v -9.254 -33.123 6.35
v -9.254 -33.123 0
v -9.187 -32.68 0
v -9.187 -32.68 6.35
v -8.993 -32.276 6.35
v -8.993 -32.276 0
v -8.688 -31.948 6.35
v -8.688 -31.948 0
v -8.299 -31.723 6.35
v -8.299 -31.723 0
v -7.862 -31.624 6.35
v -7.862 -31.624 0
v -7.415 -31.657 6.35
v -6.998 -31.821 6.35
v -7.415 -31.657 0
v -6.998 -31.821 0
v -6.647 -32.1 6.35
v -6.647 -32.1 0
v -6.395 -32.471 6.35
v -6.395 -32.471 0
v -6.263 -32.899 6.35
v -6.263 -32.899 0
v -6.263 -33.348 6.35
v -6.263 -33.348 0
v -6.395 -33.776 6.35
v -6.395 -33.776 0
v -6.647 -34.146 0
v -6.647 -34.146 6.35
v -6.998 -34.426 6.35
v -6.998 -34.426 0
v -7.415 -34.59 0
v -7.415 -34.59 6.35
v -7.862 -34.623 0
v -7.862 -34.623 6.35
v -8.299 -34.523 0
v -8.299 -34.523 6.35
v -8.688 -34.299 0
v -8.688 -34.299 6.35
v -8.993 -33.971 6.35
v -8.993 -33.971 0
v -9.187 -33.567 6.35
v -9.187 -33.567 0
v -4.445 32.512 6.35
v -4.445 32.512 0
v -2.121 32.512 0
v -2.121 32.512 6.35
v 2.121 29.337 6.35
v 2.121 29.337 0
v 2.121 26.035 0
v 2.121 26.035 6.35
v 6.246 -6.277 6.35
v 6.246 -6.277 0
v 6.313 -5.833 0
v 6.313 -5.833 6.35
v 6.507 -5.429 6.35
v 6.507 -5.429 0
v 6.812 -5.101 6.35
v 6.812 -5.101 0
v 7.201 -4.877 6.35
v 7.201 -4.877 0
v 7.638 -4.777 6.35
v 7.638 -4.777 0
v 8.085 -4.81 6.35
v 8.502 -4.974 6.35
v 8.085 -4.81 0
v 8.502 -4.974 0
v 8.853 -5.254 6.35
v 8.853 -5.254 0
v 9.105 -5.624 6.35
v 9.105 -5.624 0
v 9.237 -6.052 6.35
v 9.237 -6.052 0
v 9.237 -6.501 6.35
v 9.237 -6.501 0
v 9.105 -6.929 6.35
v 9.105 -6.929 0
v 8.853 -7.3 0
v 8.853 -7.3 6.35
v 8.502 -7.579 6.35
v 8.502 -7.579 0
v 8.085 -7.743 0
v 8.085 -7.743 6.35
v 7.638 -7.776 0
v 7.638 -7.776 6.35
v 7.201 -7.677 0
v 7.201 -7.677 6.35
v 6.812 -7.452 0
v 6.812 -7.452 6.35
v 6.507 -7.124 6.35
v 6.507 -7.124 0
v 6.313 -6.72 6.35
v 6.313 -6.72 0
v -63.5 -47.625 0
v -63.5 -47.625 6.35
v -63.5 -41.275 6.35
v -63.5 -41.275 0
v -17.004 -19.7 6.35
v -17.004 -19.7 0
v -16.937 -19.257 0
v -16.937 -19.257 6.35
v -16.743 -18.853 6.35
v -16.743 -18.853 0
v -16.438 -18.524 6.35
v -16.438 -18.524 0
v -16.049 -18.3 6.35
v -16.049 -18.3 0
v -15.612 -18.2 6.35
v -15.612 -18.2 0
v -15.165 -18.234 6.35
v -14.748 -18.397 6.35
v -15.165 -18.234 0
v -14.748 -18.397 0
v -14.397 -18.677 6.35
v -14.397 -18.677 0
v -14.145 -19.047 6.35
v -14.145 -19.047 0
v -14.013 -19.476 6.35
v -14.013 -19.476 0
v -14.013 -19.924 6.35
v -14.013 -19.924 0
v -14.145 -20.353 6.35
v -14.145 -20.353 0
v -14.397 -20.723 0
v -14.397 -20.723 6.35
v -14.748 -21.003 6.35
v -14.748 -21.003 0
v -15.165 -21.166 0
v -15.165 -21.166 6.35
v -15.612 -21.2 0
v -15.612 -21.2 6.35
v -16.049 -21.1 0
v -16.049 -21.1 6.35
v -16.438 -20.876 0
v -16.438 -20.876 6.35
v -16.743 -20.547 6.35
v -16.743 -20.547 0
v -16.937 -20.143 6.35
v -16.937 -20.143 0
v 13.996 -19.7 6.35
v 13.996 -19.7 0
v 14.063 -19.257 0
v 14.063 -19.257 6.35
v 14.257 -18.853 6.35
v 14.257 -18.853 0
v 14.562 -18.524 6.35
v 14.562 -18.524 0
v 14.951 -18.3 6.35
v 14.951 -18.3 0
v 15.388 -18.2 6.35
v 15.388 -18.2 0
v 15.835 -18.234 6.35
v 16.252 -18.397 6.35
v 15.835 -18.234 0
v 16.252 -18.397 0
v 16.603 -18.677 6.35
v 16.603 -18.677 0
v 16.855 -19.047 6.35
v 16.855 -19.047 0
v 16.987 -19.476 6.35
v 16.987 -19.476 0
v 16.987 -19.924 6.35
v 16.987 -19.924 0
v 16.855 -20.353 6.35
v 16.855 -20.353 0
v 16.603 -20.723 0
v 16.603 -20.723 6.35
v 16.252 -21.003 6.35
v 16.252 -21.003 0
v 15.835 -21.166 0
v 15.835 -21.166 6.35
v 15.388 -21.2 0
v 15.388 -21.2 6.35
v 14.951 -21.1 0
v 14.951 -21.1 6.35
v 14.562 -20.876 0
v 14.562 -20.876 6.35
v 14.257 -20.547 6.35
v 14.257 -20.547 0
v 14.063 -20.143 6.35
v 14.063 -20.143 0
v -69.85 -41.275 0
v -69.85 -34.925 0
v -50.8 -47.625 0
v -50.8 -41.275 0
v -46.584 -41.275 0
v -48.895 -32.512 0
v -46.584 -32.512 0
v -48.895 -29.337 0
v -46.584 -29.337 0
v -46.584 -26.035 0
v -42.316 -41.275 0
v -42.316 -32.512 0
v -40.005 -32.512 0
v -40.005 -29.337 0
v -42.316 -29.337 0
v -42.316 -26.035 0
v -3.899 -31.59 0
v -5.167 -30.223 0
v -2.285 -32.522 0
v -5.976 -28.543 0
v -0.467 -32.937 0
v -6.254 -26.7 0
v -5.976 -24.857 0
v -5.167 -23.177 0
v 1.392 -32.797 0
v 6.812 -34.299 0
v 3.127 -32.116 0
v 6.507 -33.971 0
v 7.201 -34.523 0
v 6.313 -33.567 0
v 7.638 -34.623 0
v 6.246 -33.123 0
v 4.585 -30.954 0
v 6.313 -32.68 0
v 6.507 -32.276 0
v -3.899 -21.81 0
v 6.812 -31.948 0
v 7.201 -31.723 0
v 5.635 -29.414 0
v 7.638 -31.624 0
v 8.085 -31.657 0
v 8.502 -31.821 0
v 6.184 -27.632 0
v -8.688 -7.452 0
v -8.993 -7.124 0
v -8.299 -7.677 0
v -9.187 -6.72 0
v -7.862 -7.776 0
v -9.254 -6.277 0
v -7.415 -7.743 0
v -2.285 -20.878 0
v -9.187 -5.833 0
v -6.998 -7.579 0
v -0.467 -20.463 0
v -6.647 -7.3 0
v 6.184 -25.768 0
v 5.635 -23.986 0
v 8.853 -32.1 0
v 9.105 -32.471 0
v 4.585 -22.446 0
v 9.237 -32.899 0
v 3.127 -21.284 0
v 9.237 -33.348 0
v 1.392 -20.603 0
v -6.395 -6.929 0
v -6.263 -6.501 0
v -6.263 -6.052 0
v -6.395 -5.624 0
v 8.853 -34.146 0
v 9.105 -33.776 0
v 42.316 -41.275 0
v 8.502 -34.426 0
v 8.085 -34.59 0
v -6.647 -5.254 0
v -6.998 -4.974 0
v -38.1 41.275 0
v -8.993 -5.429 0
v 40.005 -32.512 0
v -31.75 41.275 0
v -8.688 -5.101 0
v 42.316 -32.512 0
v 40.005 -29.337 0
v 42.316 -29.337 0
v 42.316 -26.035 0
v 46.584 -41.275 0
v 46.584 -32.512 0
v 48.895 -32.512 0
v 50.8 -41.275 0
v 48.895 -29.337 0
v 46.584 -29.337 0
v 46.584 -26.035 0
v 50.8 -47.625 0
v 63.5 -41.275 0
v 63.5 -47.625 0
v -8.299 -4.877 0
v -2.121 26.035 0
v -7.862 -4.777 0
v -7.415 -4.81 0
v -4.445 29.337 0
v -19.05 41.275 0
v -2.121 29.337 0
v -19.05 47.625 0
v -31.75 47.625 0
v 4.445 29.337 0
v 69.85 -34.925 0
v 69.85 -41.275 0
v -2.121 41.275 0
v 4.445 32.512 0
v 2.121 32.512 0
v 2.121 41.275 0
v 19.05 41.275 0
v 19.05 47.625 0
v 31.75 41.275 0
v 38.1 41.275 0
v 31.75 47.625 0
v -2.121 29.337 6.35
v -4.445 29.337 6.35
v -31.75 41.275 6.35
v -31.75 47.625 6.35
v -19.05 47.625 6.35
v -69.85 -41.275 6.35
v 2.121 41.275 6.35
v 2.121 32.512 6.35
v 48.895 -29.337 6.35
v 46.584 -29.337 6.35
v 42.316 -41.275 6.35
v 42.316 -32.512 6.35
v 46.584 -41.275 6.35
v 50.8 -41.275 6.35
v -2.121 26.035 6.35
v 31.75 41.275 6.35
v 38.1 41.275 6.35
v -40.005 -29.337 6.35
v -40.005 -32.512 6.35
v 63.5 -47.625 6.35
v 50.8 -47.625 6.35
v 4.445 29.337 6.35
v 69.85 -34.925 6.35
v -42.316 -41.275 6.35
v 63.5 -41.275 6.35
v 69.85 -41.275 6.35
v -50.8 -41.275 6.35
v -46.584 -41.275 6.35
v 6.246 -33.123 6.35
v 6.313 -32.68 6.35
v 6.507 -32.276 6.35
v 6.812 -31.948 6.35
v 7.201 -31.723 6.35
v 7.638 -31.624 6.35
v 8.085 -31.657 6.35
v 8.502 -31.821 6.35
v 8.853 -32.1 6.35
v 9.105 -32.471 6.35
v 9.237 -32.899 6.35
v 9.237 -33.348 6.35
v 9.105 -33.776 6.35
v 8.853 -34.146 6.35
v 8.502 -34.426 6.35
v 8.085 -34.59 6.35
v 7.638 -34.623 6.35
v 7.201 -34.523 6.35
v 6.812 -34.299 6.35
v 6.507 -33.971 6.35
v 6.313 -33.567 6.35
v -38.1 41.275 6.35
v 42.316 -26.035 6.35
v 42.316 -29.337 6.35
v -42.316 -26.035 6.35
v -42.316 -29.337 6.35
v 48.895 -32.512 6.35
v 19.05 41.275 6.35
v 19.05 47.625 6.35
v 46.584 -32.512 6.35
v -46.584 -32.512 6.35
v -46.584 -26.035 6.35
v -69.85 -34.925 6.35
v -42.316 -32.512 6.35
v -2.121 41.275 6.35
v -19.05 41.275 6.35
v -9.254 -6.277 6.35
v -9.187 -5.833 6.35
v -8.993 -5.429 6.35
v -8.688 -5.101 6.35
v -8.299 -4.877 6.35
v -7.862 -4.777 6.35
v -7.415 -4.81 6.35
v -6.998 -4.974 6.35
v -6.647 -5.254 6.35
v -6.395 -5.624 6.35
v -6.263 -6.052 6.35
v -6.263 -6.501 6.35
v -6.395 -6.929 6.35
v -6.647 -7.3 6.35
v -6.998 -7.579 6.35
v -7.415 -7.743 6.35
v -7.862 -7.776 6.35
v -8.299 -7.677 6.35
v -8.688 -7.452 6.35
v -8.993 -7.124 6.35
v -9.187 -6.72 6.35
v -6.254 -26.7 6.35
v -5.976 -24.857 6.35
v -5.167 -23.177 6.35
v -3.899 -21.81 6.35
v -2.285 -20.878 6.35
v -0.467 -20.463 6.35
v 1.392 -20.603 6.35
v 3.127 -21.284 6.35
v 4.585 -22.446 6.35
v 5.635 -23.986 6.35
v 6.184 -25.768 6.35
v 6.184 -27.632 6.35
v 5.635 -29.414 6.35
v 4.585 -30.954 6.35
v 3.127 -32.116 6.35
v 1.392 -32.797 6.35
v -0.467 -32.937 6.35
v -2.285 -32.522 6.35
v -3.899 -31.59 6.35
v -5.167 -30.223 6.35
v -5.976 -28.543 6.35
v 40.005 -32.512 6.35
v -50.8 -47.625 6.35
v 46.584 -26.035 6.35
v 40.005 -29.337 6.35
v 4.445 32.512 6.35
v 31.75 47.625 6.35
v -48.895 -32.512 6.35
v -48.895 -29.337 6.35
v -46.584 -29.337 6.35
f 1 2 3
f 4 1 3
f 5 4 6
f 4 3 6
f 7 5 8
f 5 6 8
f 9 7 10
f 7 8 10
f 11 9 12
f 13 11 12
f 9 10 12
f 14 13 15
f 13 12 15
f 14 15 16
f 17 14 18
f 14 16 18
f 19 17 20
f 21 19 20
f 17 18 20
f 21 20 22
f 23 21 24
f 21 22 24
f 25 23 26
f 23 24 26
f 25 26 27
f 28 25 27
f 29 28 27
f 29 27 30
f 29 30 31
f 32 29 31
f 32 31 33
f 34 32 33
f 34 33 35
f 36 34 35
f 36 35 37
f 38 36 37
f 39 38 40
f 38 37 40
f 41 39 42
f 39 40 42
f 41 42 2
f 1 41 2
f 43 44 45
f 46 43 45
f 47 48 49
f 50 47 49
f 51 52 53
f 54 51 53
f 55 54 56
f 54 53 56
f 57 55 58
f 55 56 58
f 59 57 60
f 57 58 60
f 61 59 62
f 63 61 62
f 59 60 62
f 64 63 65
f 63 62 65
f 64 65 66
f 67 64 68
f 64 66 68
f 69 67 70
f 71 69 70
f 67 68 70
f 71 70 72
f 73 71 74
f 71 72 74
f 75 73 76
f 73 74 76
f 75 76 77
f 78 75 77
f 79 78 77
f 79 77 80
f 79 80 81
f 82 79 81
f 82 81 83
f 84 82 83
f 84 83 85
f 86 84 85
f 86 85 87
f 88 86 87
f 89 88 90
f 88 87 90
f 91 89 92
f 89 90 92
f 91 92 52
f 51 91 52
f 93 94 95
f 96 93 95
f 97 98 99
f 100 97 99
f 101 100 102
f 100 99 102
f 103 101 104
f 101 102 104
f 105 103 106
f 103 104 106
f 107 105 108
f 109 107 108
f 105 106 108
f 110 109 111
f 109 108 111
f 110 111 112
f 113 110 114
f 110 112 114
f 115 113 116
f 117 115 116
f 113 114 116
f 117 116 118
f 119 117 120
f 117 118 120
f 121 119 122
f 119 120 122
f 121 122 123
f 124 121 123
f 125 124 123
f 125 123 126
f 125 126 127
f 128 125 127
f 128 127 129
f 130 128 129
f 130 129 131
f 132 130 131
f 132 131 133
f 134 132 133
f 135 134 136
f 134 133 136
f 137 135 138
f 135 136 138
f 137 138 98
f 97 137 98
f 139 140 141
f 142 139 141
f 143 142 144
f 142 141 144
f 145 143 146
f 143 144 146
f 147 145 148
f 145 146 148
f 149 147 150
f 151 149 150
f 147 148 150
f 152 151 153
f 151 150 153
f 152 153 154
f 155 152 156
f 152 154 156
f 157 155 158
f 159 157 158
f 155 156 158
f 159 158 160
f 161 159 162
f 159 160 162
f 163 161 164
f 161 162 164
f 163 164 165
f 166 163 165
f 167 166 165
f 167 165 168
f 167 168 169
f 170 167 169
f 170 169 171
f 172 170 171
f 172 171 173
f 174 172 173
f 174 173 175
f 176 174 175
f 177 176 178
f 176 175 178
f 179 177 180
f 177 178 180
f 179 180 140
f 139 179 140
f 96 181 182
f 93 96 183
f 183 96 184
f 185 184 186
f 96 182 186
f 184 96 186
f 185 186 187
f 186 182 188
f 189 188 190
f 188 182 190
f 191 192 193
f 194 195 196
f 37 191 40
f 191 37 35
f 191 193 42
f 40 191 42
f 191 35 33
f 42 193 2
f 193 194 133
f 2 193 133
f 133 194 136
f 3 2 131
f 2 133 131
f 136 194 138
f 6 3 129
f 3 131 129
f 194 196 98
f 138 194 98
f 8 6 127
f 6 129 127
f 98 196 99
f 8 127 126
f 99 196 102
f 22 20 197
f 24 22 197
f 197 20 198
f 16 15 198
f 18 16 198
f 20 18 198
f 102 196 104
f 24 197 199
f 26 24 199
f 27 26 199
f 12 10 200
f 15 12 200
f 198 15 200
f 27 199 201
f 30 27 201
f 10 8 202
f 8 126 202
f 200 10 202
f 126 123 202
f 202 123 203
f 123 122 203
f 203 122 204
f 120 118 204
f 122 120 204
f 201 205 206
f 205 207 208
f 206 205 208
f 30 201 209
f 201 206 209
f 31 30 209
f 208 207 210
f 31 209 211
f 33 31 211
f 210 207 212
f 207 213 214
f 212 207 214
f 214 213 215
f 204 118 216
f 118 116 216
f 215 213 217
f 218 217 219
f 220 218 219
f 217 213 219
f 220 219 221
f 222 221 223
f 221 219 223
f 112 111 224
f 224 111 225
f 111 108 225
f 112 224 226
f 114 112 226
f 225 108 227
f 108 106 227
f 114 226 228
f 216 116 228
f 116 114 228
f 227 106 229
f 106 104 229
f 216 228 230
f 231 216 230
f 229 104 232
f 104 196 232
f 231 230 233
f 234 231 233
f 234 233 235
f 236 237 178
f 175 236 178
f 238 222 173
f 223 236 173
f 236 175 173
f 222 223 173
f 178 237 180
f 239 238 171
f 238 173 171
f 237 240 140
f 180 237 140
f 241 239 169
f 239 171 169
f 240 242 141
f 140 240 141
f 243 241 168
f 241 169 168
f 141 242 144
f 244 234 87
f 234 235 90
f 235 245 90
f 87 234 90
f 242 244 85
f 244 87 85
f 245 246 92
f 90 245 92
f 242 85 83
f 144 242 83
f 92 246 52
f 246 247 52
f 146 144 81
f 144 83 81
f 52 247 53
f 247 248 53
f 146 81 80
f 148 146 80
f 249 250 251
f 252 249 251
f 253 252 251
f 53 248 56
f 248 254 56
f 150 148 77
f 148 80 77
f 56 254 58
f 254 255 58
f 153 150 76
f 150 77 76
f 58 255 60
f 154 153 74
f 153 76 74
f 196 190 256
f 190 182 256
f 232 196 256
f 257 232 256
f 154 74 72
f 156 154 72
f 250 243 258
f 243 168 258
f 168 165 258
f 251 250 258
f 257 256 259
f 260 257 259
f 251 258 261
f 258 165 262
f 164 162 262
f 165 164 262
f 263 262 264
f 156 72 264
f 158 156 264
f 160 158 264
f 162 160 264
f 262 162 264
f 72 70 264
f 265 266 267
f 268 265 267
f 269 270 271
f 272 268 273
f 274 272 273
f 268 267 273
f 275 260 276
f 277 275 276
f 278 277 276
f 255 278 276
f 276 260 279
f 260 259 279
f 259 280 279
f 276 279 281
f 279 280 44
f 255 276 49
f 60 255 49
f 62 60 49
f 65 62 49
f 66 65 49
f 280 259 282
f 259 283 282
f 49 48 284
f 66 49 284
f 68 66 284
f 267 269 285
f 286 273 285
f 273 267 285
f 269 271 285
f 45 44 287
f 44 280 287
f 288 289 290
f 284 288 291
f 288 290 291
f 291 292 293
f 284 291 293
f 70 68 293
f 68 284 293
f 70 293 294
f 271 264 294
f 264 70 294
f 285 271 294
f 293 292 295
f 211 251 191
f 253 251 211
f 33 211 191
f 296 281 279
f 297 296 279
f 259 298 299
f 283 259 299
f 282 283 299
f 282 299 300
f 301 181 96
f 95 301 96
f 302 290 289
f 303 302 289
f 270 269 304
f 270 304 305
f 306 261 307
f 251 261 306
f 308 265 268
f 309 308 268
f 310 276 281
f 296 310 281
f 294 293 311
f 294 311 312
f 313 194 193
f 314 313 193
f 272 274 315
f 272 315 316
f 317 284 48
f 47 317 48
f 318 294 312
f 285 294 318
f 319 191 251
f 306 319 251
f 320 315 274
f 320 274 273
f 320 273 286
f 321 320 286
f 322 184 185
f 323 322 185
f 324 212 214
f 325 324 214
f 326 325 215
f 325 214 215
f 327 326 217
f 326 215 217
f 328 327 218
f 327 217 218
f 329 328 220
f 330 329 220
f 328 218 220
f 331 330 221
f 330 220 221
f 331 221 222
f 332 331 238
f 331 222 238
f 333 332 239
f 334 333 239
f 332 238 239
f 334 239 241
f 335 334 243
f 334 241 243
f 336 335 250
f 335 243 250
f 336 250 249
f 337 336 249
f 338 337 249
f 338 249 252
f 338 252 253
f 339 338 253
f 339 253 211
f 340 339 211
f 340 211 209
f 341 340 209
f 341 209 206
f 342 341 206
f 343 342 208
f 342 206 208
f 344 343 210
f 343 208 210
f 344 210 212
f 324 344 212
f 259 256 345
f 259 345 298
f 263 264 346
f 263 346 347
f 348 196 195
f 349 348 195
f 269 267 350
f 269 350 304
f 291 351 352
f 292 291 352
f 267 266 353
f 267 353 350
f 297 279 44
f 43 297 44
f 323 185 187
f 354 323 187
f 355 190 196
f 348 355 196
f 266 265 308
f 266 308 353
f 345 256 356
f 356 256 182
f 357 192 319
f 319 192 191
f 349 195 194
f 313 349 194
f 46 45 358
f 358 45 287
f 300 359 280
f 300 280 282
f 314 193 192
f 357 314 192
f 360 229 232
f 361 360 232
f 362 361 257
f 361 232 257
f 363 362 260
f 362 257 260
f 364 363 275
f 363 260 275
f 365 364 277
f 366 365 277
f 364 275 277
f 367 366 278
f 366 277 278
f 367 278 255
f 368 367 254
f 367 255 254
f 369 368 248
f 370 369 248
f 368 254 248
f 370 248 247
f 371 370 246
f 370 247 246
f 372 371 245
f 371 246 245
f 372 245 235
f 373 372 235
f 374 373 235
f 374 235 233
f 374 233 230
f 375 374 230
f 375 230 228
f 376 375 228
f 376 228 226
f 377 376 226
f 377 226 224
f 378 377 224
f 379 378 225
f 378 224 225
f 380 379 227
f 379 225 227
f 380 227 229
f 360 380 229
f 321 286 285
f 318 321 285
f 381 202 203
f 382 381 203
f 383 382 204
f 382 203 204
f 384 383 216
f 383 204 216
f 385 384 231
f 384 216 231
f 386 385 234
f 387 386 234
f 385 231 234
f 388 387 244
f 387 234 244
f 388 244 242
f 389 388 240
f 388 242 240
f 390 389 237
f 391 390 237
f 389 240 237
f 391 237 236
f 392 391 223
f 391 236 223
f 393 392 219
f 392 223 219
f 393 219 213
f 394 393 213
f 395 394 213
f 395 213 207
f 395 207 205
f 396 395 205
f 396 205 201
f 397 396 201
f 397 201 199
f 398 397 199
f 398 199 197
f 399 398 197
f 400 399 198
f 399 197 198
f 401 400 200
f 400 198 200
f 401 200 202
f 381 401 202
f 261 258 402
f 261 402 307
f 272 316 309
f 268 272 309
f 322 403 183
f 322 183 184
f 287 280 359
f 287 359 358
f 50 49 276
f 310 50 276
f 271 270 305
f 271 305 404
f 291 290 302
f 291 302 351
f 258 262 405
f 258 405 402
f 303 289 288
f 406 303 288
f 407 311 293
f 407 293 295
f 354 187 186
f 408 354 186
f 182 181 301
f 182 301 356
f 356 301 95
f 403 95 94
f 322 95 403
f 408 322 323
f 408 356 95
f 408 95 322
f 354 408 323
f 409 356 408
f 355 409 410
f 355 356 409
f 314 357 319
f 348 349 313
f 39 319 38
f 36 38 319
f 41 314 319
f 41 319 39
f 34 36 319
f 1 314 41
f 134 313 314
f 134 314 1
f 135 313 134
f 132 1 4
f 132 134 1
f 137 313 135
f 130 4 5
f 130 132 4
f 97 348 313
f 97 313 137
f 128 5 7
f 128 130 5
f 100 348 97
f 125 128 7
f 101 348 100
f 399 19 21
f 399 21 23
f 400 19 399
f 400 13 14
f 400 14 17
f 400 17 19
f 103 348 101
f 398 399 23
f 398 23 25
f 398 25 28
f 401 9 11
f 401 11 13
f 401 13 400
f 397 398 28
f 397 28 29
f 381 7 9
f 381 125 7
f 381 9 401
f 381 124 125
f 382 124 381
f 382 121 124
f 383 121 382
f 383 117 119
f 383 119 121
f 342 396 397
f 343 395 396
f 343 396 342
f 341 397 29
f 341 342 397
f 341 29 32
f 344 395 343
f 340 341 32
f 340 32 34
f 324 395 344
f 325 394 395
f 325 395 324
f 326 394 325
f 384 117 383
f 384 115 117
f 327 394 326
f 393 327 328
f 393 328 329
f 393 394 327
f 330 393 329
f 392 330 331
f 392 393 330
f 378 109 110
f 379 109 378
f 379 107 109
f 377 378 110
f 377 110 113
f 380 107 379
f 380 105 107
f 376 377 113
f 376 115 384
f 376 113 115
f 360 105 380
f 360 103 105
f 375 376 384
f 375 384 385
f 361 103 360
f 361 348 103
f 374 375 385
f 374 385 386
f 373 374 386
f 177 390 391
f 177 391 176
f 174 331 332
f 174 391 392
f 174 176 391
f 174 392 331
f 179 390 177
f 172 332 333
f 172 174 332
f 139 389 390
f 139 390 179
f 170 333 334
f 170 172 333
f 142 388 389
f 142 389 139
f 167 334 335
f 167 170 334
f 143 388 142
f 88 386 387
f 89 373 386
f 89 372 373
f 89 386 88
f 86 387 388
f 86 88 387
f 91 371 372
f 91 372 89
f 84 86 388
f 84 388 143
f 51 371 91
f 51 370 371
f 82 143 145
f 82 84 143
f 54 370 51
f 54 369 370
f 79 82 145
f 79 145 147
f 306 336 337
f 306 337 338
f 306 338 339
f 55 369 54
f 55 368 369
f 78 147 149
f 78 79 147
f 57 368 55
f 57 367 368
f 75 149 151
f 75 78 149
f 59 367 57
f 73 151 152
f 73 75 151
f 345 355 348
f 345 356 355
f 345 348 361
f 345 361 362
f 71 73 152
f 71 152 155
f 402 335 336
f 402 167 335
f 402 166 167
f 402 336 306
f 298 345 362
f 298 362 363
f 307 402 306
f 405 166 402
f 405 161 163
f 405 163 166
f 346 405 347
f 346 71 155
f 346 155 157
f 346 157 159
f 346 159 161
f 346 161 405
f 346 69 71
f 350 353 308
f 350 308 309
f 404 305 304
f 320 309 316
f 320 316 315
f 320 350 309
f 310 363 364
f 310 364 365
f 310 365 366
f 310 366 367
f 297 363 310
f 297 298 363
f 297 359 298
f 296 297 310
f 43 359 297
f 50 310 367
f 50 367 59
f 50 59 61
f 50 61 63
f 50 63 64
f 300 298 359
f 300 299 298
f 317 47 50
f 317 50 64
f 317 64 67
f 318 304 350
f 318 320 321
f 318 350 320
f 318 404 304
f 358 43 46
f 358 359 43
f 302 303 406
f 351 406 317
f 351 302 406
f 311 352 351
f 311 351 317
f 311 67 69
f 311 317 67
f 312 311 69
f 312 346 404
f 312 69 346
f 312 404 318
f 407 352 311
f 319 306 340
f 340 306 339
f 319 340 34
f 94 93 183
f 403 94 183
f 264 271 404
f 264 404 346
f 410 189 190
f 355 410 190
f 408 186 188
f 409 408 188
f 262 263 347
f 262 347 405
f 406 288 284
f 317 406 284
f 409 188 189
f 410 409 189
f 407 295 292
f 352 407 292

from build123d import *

# Parameters (mm, degrees)
SKETCH1_W           = 139.7
SKETCH1_H           = 82.55
BOSS_EXTRUDE1_DEPTH = 6.35
SKETCH2_W           = 12.7
SKETCH2_H           = 6.35
BOSS_EXTRUDE2_DEPTH = 6.35
CUT_EXTRUDE1_DEPTH  = 6.35
CUT_EXTRUDE8_DEPTH  = 6.35
CUT_EXTRUDE2_DEPTH  = 6.35
SKETCH5_R           = 6.254
SKETCH5_R_2         = 1.504
CUT_EXTRUDE9_DEPTH  = 6.35


with BuildPart() as part:
    # Sketch1 → Boss-Extrude1 (new body)
    with BuildSketch(Plane.XY):
        Rectangle(SKETCH1_W, SKETCH1_H)
    extrude(amount=BOSS_EXTRUDE1_DEPTH)

    # Sketch2 → Boss-Extrude2 (add)
    with BuildSketch(Plane(origin=(0, 0, 0), x_dir=(-1, 0, 0), z_dir=(0, 0, -1))):
        with Locations((-57.15, -44.45)):
            Rectangle(SKETCH2_W, SKETCH2_H)
        with Locations((-25.4, 44.45)):
            Rectangle(SKETCH2_W, SKETCH2_H)
    boss_extrude2 = extrude(amount=-BOSS_EXTRUDE2_DEPTH)

    # Sketch3 → Cut-Extrude1 (cut)
    with BuildSketch(Plane(origin=(0, 0, 0), x_dir=(-1, 0, 0), z_dir=(0, 0, -1))):
        Polygon((-46.5836, -41.275), (-46.5836, -32.512), (-48.895, -32.512), (-48.895, -29.337), (-46.5836, -29.337), (-46.5836, -26.035), (-42.3164, -26.035), (-42.3164, -29.337), (-40.005, -29.337), (-40.005, -32.512), (-42.3164, -32.512), (-42.3164, -41.275), align=None)
    cut_extrude1 = extrude(amount=-CUT_EXTRUDE1_DEPTH, mode=Mode.SUBTRACT)

    # Sketch7 → Cut-Extrude8 (cut)
    with BuildSketch(Plane(origin=(0, 0, 0), x_dir=(-1, 0, 0), z_dir=(0, 0, -1))):
        Polygon((-38.1, 41.275), (-69.85, -34.925), (-69.85, 41.275), align=None)
    cut_extrude8 = extrude(amount=-CUT_EXTRUDE8_DEPTH, mode=Mode.SUBTRACT)

    # Mirror2: Boss-Extrude2, Cut-Extrude8 across plane
    add(boss_extrude2.mirror(Plane(origin=(0, 0, 0), x_dir=(0, 0, 1), z_dir=(1, 0, 0))))
    add(cut_extrude8.mirror(Plane(origin=(0, 0, 0), x_dir=(0, 0, 1), z_dir=(1, 0, 0))), mode=Mode.SUBTRACT)

    # Mirror4: Cut-Extrude1 across plane
    add(cut_extrude1.mirror(Plane(origin=(0, 0, 0), x_dir=(0, 0, 1), z_dir=(1, 0, 0))), mode=Mode.SUBTRACT)

    # Sketch4 → Cut-Extrude2 (cut)
    with BuildSketch(Plane(origin=(0, 0, 0), x_dir=(-1, 0, 0), z_dir=(0, 0, -1))):
        Polygon((2.1209, 41.275), (-2.1209, 41.275), (-2.1209, 32.512), (-4.445, 32.512), (-4.445, 29.337), (-2.1209, 29.337), (-2.1209, 26.035), (2.1209, 26.035), (2.1209, 29.337), (4.445, 29.337), (4.445, 32.512), (2.1209, 32.512), align=None)
    extrude(amount=-CUT_EXTRUDE2_DEPTH, mode=Mode.SUBTRACT)

    # Sketch5 → Cut-Extrude9 (cut)
    with BuildSketch(Plane(origin=(0, 0, 0), x_dir=(-1, 0, 0), z_dir=(0, 0, -1))):
        with Locations((0, -26.7)):
            Circle(SKETCH5_R)
        with Locations((-15.5, -19.7)):
            Circle(SKETCH5_R_2)
        with Locations((-7.75, -6.276606241)):
            Circle(SKETCH5_R_2)
        with Locations((7.75, -6.276606241)):
            Circle(SKETCH5_R_2)
        with Locations((15.5, -19.7)):
            Circle(SKETCH5_R_2)
        with Locations((7.75, -33.123393759)):
            Circle(SKETCH5_R_2)
        with Locations((-7.75, -33.123393759)):
            Circle(SKETCH5_R_2)
    extrude(amount=-CUT_EXTRUDE9_DEPTH, mode=Mode.SUBTRACT)


solid = part.part
